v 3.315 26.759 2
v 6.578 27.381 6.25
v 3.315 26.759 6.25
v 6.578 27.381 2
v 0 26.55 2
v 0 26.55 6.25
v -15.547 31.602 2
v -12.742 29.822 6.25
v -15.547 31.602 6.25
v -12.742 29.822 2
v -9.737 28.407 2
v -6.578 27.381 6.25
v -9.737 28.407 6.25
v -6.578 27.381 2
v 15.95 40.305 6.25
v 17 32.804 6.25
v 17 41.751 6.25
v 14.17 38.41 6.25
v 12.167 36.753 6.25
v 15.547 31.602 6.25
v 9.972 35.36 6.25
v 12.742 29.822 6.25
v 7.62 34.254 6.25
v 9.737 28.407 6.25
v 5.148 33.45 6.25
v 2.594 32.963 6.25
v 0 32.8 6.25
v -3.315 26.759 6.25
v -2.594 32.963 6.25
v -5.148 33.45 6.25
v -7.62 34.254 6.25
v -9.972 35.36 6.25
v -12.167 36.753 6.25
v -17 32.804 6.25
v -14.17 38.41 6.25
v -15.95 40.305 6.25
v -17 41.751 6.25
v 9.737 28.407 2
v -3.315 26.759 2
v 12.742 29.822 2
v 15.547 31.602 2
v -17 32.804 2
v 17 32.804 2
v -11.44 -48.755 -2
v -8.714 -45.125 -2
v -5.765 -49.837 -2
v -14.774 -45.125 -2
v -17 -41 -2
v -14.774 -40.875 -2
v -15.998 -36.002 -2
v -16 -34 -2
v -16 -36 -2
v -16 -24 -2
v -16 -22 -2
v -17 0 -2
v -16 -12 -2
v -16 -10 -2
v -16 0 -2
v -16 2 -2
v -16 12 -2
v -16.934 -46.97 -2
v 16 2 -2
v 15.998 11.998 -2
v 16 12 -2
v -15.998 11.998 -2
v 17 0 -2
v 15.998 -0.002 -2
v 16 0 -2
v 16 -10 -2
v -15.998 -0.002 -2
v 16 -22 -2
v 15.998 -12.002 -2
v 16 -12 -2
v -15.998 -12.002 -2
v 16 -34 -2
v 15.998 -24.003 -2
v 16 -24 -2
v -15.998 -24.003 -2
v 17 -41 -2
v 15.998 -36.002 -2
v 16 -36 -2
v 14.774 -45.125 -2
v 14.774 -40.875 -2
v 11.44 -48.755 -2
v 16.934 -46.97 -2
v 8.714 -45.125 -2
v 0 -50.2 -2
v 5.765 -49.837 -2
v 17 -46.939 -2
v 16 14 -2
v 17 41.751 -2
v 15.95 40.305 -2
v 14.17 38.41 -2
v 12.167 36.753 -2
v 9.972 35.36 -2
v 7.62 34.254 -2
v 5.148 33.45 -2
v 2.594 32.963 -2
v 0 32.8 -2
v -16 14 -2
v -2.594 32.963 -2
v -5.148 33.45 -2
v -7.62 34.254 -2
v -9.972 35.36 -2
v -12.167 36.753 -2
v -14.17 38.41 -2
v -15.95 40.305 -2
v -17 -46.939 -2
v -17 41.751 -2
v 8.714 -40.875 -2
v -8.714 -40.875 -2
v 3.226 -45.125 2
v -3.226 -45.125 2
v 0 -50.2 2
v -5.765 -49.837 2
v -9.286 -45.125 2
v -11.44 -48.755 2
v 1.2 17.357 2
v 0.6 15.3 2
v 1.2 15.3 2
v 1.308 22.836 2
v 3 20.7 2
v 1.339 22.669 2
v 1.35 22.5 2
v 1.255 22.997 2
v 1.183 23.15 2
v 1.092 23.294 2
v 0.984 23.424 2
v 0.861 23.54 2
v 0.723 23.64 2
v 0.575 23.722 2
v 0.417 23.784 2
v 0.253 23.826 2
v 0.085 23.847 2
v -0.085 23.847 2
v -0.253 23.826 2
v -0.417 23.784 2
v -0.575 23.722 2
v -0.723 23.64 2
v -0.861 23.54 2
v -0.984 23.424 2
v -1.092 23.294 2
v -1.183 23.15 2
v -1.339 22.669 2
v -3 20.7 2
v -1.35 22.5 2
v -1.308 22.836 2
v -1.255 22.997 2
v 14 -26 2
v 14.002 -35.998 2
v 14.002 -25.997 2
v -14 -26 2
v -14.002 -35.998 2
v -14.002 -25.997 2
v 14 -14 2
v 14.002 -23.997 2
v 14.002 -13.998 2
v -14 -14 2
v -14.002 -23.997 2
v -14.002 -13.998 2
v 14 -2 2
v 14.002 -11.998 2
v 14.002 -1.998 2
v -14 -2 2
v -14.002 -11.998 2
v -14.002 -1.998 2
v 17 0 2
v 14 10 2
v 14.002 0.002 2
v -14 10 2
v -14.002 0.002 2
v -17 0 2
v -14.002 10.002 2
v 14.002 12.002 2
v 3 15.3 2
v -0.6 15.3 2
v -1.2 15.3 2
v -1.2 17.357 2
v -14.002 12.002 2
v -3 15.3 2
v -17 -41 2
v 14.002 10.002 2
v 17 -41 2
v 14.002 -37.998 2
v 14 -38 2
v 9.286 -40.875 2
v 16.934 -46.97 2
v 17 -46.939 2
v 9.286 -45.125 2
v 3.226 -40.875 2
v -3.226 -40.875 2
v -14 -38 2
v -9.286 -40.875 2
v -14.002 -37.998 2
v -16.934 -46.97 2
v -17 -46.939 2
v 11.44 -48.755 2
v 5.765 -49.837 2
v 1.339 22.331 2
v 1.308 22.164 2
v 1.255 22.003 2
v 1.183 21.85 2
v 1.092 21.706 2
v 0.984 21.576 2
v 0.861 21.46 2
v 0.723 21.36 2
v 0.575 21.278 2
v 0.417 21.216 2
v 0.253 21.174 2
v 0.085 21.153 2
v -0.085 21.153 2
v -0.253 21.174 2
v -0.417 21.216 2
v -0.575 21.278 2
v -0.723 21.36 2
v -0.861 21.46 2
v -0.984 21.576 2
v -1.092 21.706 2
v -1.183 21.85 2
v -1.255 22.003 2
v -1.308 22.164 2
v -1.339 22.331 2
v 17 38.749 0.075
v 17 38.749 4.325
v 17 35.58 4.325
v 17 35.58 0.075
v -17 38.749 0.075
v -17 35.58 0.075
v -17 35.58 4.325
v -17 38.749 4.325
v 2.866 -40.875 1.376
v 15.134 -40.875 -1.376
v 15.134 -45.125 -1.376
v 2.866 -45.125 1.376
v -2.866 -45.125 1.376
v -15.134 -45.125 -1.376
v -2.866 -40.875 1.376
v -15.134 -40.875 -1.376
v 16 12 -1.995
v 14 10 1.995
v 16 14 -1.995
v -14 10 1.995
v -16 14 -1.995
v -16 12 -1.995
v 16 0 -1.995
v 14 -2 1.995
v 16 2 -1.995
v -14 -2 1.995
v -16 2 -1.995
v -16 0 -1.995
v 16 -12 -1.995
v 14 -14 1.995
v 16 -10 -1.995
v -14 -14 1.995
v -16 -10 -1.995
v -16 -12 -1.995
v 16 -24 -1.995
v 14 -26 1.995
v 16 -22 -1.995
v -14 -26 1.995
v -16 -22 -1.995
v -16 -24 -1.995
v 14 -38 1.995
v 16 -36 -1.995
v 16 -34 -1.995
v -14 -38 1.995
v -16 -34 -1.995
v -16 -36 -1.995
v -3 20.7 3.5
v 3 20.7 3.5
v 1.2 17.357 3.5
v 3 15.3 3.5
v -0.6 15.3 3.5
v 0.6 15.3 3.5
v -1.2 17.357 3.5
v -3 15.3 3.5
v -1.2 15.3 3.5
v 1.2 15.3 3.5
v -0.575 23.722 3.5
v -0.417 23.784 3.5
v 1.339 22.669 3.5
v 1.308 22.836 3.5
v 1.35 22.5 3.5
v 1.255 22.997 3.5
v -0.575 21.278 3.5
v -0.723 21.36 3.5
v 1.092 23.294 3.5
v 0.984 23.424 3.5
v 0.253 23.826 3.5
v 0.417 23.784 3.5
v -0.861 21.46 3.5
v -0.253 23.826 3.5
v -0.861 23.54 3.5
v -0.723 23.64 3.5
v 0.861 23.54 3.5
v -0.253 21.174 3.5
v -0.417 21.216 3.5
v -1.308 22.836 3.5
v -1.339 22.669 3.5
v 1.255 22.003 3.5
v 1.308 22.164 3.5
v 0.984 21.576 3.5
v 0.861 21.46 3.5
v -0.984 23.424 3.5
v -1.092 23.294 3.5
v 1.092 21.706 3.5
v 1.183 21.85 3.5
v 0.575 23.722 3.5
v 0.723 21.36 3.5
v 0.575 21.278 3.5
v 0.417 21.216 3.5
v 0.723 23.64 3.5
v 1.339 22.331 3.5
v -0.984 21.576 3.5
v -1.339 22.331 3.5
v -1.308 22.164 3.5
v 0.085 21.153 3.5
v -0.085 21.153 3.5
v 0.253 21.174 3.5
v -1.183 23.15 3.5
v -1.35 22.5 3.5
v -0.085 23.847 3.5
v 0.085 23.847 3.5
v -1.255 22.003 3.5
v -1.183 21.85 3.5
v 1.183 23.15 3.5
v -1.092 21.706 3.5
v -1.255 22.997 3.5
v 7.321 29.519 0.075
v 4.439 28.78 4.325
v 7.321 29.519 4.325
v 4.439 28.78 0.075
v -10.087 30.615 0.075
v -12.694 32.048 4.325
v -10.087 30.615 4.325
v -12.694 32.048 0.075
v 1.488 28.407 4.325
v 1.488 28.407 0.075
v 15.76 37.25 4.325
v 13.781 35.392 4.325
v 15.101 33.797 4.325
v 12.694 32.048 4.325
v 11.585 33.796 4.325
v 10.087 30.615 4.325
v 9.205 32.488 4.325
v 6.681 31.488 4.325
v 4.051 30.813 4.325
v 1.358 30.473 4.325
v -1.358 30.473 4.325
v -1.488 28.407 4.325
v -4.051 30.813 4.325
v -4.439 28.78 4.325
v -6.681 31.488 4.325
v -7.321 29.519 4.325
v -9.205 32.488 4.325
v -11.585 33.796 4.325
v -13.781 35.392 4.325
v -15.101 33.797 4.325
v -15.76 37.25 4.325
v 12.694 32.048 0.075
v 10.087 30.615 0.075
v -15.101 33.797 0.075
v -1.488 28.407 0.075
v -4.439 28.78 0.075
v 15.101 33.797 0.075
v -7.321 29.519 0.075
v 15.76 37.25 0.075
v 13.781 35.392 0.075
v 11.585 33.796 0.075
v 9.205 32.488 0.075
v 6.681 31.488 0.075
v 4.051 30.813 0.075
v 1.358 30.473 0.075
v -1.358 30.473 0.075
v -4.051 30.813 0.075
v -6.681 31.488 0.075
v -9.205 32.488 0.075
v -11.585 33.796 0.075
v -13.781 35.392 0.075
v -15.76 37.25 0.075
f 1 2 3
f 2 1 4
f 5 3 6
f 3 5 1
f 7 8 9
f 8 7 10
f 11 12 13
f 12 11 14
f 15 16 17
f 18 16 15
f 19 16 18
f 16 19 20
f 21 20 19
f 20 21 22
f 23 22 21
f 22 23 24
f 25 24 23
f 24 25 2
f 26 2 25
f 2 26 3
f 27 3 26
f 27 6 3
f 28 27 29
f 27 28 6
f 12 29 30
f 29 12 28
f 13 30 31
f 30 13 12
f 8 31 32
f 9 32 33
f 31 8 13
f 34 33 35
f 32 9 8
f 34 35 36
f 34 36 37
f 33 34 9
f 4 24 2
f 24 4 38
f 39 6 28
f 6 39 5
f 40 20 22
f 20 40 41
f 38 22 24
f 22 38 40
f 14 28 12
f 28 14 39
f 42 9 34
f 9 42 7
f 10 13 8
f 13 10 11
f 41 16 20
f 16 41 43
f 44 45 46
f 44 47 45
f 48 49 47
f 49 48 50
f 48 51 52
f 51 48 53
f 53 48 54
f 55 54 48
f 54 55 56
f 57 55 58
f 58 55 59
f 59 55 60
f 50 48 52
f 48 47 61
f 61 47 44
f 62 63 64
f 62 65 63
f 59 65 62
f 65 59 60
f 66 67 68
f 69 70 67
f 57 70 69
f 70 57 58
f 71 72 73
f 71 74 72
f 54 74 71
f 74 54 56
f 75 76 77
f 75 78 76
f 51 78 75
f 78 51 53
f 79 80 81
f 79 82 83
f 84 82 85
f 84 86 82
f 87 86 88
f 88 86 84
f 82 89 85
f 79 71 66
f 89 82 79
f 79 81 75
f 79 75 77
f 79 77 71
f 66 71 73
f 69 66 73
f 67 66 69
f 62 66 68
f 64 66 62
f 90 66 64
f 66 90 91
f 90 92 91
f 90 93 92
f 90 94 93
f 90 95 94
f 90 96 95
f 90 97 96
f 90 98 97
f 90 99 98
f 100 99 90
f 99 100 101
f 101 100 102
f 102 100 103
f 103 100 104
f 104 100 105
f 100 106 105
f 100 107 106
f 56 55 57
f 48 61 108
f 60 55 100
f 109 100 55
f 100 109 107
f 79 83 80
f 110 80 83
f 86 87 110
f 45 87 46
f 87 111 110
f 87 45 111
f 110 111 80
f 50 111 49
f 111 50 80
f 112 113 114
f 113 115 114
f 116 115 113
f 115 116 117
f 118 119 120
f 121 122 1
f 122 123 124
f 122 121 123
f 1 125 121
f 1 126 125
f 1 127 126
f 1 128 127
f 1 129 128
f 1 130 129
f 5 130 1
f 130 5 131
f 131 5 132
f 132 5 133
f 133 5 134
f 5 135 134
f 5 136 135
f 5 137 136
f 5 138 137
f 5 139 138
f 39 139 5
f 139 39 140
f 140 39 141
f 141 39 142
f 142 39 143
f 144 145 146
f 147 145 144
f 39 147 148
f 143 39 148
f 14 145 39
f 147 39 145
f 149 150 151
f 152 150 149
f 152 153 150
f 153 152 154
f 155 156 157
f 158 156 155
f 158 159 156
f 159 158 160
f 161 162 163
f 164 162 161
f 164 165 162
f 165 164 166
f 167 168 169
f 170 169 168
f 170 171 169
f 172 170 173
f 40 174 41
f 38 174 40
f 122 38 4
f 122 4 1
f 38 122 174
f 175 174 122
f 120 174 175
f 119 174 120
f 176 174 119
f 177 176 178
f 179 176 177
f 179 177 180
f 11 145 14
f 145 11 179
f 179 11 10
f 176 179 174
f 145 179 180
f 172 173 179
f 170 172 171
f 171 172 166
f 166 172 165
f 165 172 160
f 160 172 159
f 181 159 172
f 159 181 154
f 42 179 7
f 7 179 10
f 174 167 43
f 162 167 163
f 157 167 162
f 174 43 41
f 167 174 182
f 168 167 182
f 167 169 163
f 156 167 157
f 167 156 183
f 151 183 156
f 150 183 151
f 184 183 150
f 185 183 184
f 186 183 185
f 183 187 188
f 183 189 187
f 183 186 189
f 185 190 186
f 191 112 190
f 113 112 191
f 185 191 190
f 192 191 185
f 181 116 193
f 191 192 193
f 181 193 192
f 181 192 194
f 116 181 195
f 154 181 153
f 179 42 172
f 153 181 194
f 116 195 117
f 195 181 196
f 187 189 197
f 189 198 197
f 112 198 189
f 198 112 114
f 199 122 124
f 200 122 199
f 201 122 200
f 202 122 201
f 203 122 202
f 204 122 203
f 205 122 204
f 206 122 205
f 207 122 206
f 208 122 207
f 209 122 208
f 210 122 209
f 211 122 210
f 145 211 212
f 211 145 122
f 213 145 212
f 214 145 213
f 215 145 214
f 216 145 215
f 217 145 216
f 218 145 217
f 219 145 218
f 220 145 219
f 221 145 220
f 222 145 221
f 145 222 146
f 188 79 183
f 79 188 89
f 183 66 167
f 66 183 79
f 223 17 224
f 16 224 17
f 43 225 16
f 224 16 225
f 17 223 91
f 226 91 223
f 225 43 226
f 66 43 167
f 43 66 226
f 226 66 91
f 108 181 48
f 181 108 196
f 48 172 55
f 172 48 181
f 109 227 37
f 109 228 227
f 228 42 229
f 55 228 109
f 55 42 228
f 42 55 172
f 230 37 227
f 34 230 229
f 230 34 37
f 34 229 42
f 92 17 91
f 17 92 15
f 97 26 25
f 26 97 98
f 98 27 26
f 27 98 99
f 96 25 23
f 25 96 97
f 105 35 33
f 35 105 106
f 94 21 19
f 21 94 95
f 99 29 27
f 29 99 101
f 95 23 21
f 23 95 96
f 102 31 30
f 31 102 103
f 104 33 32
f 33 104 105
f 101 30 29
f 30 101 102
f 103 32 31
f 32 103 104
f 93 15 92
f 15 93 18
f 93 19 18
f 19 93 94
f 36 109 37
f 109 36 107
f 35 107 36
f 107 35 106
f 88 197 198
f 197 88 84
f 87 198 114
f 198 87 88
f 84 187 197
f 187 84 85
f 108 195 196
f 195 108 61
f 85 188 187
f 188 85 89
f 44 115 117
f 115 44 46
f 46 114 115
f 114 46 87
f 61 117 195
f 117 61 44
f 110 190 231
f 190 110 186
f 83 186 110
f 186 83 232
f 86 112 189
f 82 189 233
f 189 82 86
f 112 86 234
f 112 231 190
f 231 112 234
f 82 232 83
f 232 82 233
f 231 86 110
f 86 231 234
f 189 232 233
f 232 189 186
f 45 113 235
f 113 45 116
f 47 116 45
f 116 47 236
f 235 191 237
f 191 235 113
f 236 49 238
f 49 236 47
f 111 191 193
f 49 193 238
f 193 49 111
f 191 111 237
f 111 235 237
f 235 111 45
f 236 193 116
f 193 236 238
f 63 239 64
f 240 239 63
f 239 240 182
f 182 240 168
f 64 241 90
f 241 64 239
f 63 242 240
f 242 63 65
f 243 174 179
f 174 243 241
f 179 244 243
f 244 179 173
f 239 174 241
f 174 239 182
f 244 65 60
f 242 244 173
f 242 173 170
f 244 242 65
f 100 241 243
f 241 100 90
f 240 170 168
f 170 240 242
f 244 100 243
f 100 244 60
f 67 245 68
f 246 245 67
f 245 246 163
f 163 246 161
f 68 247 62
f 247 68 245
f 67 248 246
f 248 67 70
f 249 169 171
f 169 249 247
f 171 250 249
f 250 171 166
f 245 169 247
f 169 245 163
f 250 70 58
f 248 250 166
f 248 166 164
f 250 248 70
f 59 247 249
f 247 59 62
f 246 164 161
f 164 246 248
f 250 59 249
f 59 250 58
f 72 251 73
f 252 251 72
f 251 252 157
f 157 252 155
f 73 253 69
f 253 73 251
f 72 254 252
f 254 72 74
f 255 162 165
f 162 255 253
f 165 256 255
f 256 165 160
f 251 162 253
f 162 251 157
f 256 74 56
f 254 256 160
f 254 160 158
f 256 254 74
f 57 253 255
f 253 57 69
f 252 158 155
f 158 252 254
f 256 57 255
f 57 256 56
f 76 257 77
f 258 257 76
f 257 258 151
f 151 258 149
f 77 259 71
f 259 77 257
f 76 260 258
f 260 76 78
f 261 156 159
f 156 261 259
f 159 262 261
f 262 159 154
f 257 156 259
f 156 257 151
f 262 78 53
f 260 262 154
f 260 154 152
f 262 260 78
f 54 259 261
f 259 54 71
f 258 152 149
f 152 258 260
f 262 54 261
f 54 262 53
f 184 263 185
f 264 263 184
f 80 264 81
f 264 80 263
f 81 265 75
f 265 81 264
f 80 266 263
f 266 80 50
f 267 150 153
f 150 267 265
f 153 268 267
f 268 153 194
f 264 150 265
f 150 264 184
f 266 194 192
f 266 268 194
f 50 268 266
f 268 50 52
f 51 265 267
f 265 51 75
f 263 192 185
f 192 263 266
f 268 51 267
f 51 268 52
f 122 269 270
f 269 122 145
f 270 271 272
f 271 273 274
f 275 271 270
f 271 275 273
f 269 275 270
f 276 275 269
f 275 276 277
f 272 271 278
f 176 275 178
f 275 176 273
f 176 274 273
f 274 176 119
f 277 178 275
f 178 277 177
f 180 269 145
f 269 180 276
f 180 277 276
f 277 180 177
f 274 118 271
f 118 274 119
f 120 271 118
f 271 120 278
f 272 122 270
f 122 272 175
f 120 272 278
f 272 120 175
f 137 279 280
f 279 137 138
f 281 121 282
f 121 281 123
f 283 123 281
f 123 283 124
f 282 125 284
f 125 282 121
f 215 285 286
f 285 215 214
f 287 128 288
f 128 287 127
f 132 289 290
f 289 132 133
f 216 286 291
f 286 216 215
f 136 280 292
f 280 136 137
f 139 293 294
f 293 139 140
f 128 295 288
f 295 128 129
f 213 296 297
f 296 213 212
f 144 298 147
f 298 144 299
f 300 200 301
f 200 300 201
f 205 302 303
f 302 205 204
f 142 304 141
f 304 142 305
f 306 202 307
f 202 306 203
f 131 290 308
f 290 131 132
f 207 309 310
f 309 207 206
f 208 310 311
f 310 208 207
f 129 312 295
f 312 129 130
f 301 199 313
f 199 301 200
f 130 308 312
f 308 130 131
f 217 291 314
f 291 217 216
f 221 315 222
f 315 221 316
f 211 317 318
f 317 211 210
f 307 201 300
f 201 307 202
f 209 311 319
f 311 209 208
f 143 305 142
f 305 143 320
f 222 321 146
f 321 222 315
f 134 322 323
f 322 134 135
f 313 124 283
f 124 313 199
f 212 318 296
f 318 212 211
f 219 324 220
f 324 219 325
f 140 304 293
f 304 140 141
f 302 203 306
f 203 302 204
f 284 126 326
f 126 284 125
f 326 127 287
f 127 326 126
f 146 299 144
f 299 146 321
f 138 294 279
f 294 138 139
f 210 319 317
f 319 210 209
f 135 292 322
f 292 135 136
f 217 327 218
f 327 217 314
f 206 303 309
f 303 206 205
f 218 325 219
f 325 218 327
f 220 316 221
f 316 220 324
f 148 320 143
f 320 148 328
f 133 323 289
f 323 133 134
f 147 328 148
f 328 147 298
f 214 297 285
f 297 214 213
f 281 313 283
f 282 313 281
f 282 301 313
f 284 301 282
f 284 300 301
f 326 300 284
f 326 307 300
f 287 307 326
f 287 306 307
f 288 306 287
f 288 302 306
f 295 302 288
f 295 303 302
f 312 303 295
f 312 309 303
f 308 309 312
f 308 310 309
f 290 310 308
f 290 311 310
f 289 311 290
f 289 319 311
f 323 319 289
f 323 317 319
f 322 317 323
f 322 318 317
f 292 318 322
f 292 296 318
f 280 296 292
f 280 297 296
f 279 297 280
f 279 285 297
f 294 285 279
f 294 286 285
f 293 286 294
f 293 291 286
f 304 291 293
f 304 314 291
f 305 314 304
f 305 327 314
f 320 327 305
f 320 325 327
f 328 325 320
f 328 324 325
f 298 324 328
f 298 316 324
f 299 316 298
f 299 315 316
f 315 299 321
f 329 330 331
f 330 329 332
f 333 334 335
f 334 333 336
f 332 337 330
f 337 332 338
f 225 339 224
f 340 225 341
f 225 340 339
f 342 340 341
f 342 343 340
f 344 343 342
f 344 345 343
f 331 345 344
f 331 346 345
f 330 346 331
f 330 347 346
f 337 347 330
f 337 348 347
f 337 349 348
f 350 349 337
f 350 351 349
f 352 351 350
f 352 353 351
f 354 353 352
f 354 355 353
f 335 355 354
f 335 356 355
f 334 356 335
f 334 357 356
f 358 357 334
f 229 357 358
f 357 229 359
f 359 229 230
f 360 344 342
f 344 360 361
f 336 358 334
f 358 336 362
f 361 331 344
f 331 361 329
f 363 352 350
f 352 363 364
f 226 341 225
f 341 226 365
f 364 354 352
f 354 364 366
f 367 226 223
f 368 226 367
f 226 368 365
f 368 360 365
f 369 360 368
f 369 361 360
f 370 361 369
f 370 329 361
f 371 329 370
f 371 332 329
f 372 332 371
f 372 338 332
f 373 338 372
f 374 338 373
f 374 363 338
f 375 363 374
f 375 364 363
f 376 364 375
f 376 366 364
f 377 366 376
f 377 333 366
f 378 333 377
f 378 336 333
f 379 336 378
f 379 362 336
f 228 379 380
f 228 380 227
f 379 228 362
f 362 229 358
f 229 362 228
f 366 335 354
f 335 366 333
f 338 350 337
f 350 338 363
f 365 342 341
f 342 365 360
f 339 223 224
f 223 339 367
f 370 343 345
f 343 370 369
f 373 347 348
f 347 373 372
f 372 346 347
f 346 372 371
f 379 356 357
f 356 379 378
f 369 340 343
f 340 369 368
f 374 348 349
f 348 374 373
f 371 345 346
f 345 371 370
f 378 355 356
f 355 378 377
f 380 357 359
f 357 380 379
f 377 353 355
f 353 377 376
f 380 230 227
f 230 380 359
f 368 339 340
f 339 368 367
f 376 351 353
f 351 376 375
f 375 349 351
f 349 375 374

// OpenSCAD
$fn = 50;

// number of GU slots
gels = 5; // [5:12]
gel_width = 32 / 1;
gel_cut_width = 28 / 1;
gel_opening = 2 / 1;
gel_spacing = 10 / 1;

ladder_margin = 16 / 1;
ladder_length = gel_opening * gels + gel_spacing * (gels - 1) + ladder_margin * 2;
ladder_width = gel_width + gel_opening;
ladder_thickness = 4 / 1;
ladder_round = 1 / 1;

// diameter of front stem
stem_diameter = 46; // [44:50]
stem_radius = stem_diameter / 2;

zip_thickness = 1.5 / 1;
zip_width = 3.75 / 1;
zip_height = 4.25 / 1;

logo_head = 10 / 1;
logo_m_thick = 6 / 1;
logo_m_thin = 4 / 1;

// show logo (just for fun)
logo = "yes"; // [yes, no]

// add slot for second zip tie (recommended)
second_zip_tie = "yes"; // [yes, no]

module slot() {
    translate([0, 0, -(ladder_thickness / 2)]) {
        hull() {
            cube([gel_opening, gel_width, 0.01], true);
            translate([gel_opening, 0, ladder_thickness]) {
                cube([gel_opening, gel_cut_width, 0.01], true);
            }
        }
    }
}

module ladder() {
    difference() {
        union() {
            // initial ladder
            cube([ladder_length, ladder_width, ladder_thickness], true);
            
            // add on the front ring for the zip tie, make it a half ring
            translate([-ladder_length / 2 - ladder_margin * .75, 0, zip_height / 2]) {
                    difference() {
                        cylinder(ladder_thickness + zip_height, stem_radius * 1.15, stem_radius * 1.15, true);
                        translate([-stem_radius, 0, 0]) {
                            cube([stem_diameter, stem_diameter, stem_diameter], true);
                        }
                    }
            }        
        }
        
        translate([-(ladder_length / 2) - zip_thickness * 3 - ladder_margin * .75 + 4, 0, 0]) {
                cylinder(ladder_thickness * 5, stem_radius * .9, stem_radius * .9, true);
        }

        
         // remove sides
        translate([-ladder_length, ladder_width, 0]) {
            cube([ladder_length * 2, ladder_width, ladder_thickness * 5], true);
        }

        translate([-ladder_length, -ladder_width, 0]) {
            cube([ladder_length * 2, ladder_width, ladder_thickness * 5], true);
        }  
        

    }
    

    // round off the end of the ladder
    difference() {
        translate([ladder_length / 2 - stem_diameter * .8, 0, 0]) {
            cylinder(ladder_thickness, stem_diameter, stem_diameter, true);
        }
        translate([0, ladder_width, 0]) {
            cube([ladder_length * 10, ladder_width, ladder_thickness + .1], true);
        }
        translate([0, -ladder_width, 0]) {
            cube([ladder_length * 10, ladder_width, ladder_thickness + .1], true);
        }

        translate([-ladder_width, 0, 0]) {
                cube([ladder_width, ladder_width, ladder_width], true);
        }        
    }

}

module stemzip() {
    difference() {
        cylinder(zip_height, stem_radius * 1.03, stem_radius * 1.03, true);
        scale([.94, .94, .94 ]) {
            cylinder(zip_height * 2, stem_radius, stem_radius, true);
        }
    }
}


// showtime!
module main() {
    difference() {
        ladder();
        translate([-(ladder_length / 2 + stem_radius + ladder_margin) + zip_height - zip_thickness, 0, zip_height / 2]) {
            stemzip();
        }    
        for (offset = [0: gels]) {
            translate([(gel_opening + gel_spacing) * offset - ladder_length / 2 + ladder_margin * 1.75, 0, 0]) {
                if (offset < gels) {
                    slot();
                }
                
                if (second_zip_tie == "yes") {
                    if (offset == gels) {
                        translate([- (gel_spacing / 2) + 1, ladder_width / 2 - 8, 0]) {
                            rotate([60, 0, 0]) {
                                cube([zip_height, zip_width, ladder_thickness * 3], true);
                            }
                        }
                        translate([- (gel_spacing / 2) + 1, -ladder_width / 2 + 8, 0]) {
                            rotate([-60, 0, 0]) {
                                cube([zip_height, zip_width, ladder_thickness * 3], true);
                            }
                        }
                    }
                }
                
            }

        }
    }
}

module logo_half() {
    translate([0, -(logo_m_thick / 2 + 6), 0]) {    
        hull() {
            
            translate([-(logo_m_thick * 1), 4.5, 0]) {
                cube([logo_m_thick, logo_m_thick, logo_head], true);
            }
         
            translate([logo_m_thick + (logo_m_thick - logo_m_thin) / 2, 7, 0]) {
                cube([logo_m_thin, logo_m_thin, logo_head], true) {
                }
            }
        }
        translate([-(logo_m_thick * 1), 0, 0]) {
            cube([logo_m_thick, logo_m_thick, logo_head], true);
        }
        
        translate([0, 0, 0]) {
            cube([logo_m_thick * 3, logo_m_thick, logo_head], true);
        }
    }
}

module logo() {
    translate([0, logo_m_thick * 3 - 3, 0]) {
        cylinder(logo_head, 4.5, 4.5, true);
    }
    rotate([0, 0, -90]) {
        translate([0, logo_m_thin / 2, 0]) {
            logo_half();
        }
        translate([0, -(logo_m_thin / 2), 0]) {
            mirror([0, 1, 0]) {
                logo_half();
            }
        }
    }
}




difference() {
    union() {
        rotate([0, 0, -90]) {
            main();
        }

        if (logo == "yes") {
            // add the logo
            translate([0, ladder_length / 2 - ladder_margin - gel_spacing + 3, 2]) {
                scale([.3, .3, .3]) {
                    logo();
                }
            }
        }
    }



    translate([0, ladder_length / 2 + ladder_margin - zip_thickness * 3.3, ladder_thickness / 2 + .2]) {
        stemzip();
    }
}
